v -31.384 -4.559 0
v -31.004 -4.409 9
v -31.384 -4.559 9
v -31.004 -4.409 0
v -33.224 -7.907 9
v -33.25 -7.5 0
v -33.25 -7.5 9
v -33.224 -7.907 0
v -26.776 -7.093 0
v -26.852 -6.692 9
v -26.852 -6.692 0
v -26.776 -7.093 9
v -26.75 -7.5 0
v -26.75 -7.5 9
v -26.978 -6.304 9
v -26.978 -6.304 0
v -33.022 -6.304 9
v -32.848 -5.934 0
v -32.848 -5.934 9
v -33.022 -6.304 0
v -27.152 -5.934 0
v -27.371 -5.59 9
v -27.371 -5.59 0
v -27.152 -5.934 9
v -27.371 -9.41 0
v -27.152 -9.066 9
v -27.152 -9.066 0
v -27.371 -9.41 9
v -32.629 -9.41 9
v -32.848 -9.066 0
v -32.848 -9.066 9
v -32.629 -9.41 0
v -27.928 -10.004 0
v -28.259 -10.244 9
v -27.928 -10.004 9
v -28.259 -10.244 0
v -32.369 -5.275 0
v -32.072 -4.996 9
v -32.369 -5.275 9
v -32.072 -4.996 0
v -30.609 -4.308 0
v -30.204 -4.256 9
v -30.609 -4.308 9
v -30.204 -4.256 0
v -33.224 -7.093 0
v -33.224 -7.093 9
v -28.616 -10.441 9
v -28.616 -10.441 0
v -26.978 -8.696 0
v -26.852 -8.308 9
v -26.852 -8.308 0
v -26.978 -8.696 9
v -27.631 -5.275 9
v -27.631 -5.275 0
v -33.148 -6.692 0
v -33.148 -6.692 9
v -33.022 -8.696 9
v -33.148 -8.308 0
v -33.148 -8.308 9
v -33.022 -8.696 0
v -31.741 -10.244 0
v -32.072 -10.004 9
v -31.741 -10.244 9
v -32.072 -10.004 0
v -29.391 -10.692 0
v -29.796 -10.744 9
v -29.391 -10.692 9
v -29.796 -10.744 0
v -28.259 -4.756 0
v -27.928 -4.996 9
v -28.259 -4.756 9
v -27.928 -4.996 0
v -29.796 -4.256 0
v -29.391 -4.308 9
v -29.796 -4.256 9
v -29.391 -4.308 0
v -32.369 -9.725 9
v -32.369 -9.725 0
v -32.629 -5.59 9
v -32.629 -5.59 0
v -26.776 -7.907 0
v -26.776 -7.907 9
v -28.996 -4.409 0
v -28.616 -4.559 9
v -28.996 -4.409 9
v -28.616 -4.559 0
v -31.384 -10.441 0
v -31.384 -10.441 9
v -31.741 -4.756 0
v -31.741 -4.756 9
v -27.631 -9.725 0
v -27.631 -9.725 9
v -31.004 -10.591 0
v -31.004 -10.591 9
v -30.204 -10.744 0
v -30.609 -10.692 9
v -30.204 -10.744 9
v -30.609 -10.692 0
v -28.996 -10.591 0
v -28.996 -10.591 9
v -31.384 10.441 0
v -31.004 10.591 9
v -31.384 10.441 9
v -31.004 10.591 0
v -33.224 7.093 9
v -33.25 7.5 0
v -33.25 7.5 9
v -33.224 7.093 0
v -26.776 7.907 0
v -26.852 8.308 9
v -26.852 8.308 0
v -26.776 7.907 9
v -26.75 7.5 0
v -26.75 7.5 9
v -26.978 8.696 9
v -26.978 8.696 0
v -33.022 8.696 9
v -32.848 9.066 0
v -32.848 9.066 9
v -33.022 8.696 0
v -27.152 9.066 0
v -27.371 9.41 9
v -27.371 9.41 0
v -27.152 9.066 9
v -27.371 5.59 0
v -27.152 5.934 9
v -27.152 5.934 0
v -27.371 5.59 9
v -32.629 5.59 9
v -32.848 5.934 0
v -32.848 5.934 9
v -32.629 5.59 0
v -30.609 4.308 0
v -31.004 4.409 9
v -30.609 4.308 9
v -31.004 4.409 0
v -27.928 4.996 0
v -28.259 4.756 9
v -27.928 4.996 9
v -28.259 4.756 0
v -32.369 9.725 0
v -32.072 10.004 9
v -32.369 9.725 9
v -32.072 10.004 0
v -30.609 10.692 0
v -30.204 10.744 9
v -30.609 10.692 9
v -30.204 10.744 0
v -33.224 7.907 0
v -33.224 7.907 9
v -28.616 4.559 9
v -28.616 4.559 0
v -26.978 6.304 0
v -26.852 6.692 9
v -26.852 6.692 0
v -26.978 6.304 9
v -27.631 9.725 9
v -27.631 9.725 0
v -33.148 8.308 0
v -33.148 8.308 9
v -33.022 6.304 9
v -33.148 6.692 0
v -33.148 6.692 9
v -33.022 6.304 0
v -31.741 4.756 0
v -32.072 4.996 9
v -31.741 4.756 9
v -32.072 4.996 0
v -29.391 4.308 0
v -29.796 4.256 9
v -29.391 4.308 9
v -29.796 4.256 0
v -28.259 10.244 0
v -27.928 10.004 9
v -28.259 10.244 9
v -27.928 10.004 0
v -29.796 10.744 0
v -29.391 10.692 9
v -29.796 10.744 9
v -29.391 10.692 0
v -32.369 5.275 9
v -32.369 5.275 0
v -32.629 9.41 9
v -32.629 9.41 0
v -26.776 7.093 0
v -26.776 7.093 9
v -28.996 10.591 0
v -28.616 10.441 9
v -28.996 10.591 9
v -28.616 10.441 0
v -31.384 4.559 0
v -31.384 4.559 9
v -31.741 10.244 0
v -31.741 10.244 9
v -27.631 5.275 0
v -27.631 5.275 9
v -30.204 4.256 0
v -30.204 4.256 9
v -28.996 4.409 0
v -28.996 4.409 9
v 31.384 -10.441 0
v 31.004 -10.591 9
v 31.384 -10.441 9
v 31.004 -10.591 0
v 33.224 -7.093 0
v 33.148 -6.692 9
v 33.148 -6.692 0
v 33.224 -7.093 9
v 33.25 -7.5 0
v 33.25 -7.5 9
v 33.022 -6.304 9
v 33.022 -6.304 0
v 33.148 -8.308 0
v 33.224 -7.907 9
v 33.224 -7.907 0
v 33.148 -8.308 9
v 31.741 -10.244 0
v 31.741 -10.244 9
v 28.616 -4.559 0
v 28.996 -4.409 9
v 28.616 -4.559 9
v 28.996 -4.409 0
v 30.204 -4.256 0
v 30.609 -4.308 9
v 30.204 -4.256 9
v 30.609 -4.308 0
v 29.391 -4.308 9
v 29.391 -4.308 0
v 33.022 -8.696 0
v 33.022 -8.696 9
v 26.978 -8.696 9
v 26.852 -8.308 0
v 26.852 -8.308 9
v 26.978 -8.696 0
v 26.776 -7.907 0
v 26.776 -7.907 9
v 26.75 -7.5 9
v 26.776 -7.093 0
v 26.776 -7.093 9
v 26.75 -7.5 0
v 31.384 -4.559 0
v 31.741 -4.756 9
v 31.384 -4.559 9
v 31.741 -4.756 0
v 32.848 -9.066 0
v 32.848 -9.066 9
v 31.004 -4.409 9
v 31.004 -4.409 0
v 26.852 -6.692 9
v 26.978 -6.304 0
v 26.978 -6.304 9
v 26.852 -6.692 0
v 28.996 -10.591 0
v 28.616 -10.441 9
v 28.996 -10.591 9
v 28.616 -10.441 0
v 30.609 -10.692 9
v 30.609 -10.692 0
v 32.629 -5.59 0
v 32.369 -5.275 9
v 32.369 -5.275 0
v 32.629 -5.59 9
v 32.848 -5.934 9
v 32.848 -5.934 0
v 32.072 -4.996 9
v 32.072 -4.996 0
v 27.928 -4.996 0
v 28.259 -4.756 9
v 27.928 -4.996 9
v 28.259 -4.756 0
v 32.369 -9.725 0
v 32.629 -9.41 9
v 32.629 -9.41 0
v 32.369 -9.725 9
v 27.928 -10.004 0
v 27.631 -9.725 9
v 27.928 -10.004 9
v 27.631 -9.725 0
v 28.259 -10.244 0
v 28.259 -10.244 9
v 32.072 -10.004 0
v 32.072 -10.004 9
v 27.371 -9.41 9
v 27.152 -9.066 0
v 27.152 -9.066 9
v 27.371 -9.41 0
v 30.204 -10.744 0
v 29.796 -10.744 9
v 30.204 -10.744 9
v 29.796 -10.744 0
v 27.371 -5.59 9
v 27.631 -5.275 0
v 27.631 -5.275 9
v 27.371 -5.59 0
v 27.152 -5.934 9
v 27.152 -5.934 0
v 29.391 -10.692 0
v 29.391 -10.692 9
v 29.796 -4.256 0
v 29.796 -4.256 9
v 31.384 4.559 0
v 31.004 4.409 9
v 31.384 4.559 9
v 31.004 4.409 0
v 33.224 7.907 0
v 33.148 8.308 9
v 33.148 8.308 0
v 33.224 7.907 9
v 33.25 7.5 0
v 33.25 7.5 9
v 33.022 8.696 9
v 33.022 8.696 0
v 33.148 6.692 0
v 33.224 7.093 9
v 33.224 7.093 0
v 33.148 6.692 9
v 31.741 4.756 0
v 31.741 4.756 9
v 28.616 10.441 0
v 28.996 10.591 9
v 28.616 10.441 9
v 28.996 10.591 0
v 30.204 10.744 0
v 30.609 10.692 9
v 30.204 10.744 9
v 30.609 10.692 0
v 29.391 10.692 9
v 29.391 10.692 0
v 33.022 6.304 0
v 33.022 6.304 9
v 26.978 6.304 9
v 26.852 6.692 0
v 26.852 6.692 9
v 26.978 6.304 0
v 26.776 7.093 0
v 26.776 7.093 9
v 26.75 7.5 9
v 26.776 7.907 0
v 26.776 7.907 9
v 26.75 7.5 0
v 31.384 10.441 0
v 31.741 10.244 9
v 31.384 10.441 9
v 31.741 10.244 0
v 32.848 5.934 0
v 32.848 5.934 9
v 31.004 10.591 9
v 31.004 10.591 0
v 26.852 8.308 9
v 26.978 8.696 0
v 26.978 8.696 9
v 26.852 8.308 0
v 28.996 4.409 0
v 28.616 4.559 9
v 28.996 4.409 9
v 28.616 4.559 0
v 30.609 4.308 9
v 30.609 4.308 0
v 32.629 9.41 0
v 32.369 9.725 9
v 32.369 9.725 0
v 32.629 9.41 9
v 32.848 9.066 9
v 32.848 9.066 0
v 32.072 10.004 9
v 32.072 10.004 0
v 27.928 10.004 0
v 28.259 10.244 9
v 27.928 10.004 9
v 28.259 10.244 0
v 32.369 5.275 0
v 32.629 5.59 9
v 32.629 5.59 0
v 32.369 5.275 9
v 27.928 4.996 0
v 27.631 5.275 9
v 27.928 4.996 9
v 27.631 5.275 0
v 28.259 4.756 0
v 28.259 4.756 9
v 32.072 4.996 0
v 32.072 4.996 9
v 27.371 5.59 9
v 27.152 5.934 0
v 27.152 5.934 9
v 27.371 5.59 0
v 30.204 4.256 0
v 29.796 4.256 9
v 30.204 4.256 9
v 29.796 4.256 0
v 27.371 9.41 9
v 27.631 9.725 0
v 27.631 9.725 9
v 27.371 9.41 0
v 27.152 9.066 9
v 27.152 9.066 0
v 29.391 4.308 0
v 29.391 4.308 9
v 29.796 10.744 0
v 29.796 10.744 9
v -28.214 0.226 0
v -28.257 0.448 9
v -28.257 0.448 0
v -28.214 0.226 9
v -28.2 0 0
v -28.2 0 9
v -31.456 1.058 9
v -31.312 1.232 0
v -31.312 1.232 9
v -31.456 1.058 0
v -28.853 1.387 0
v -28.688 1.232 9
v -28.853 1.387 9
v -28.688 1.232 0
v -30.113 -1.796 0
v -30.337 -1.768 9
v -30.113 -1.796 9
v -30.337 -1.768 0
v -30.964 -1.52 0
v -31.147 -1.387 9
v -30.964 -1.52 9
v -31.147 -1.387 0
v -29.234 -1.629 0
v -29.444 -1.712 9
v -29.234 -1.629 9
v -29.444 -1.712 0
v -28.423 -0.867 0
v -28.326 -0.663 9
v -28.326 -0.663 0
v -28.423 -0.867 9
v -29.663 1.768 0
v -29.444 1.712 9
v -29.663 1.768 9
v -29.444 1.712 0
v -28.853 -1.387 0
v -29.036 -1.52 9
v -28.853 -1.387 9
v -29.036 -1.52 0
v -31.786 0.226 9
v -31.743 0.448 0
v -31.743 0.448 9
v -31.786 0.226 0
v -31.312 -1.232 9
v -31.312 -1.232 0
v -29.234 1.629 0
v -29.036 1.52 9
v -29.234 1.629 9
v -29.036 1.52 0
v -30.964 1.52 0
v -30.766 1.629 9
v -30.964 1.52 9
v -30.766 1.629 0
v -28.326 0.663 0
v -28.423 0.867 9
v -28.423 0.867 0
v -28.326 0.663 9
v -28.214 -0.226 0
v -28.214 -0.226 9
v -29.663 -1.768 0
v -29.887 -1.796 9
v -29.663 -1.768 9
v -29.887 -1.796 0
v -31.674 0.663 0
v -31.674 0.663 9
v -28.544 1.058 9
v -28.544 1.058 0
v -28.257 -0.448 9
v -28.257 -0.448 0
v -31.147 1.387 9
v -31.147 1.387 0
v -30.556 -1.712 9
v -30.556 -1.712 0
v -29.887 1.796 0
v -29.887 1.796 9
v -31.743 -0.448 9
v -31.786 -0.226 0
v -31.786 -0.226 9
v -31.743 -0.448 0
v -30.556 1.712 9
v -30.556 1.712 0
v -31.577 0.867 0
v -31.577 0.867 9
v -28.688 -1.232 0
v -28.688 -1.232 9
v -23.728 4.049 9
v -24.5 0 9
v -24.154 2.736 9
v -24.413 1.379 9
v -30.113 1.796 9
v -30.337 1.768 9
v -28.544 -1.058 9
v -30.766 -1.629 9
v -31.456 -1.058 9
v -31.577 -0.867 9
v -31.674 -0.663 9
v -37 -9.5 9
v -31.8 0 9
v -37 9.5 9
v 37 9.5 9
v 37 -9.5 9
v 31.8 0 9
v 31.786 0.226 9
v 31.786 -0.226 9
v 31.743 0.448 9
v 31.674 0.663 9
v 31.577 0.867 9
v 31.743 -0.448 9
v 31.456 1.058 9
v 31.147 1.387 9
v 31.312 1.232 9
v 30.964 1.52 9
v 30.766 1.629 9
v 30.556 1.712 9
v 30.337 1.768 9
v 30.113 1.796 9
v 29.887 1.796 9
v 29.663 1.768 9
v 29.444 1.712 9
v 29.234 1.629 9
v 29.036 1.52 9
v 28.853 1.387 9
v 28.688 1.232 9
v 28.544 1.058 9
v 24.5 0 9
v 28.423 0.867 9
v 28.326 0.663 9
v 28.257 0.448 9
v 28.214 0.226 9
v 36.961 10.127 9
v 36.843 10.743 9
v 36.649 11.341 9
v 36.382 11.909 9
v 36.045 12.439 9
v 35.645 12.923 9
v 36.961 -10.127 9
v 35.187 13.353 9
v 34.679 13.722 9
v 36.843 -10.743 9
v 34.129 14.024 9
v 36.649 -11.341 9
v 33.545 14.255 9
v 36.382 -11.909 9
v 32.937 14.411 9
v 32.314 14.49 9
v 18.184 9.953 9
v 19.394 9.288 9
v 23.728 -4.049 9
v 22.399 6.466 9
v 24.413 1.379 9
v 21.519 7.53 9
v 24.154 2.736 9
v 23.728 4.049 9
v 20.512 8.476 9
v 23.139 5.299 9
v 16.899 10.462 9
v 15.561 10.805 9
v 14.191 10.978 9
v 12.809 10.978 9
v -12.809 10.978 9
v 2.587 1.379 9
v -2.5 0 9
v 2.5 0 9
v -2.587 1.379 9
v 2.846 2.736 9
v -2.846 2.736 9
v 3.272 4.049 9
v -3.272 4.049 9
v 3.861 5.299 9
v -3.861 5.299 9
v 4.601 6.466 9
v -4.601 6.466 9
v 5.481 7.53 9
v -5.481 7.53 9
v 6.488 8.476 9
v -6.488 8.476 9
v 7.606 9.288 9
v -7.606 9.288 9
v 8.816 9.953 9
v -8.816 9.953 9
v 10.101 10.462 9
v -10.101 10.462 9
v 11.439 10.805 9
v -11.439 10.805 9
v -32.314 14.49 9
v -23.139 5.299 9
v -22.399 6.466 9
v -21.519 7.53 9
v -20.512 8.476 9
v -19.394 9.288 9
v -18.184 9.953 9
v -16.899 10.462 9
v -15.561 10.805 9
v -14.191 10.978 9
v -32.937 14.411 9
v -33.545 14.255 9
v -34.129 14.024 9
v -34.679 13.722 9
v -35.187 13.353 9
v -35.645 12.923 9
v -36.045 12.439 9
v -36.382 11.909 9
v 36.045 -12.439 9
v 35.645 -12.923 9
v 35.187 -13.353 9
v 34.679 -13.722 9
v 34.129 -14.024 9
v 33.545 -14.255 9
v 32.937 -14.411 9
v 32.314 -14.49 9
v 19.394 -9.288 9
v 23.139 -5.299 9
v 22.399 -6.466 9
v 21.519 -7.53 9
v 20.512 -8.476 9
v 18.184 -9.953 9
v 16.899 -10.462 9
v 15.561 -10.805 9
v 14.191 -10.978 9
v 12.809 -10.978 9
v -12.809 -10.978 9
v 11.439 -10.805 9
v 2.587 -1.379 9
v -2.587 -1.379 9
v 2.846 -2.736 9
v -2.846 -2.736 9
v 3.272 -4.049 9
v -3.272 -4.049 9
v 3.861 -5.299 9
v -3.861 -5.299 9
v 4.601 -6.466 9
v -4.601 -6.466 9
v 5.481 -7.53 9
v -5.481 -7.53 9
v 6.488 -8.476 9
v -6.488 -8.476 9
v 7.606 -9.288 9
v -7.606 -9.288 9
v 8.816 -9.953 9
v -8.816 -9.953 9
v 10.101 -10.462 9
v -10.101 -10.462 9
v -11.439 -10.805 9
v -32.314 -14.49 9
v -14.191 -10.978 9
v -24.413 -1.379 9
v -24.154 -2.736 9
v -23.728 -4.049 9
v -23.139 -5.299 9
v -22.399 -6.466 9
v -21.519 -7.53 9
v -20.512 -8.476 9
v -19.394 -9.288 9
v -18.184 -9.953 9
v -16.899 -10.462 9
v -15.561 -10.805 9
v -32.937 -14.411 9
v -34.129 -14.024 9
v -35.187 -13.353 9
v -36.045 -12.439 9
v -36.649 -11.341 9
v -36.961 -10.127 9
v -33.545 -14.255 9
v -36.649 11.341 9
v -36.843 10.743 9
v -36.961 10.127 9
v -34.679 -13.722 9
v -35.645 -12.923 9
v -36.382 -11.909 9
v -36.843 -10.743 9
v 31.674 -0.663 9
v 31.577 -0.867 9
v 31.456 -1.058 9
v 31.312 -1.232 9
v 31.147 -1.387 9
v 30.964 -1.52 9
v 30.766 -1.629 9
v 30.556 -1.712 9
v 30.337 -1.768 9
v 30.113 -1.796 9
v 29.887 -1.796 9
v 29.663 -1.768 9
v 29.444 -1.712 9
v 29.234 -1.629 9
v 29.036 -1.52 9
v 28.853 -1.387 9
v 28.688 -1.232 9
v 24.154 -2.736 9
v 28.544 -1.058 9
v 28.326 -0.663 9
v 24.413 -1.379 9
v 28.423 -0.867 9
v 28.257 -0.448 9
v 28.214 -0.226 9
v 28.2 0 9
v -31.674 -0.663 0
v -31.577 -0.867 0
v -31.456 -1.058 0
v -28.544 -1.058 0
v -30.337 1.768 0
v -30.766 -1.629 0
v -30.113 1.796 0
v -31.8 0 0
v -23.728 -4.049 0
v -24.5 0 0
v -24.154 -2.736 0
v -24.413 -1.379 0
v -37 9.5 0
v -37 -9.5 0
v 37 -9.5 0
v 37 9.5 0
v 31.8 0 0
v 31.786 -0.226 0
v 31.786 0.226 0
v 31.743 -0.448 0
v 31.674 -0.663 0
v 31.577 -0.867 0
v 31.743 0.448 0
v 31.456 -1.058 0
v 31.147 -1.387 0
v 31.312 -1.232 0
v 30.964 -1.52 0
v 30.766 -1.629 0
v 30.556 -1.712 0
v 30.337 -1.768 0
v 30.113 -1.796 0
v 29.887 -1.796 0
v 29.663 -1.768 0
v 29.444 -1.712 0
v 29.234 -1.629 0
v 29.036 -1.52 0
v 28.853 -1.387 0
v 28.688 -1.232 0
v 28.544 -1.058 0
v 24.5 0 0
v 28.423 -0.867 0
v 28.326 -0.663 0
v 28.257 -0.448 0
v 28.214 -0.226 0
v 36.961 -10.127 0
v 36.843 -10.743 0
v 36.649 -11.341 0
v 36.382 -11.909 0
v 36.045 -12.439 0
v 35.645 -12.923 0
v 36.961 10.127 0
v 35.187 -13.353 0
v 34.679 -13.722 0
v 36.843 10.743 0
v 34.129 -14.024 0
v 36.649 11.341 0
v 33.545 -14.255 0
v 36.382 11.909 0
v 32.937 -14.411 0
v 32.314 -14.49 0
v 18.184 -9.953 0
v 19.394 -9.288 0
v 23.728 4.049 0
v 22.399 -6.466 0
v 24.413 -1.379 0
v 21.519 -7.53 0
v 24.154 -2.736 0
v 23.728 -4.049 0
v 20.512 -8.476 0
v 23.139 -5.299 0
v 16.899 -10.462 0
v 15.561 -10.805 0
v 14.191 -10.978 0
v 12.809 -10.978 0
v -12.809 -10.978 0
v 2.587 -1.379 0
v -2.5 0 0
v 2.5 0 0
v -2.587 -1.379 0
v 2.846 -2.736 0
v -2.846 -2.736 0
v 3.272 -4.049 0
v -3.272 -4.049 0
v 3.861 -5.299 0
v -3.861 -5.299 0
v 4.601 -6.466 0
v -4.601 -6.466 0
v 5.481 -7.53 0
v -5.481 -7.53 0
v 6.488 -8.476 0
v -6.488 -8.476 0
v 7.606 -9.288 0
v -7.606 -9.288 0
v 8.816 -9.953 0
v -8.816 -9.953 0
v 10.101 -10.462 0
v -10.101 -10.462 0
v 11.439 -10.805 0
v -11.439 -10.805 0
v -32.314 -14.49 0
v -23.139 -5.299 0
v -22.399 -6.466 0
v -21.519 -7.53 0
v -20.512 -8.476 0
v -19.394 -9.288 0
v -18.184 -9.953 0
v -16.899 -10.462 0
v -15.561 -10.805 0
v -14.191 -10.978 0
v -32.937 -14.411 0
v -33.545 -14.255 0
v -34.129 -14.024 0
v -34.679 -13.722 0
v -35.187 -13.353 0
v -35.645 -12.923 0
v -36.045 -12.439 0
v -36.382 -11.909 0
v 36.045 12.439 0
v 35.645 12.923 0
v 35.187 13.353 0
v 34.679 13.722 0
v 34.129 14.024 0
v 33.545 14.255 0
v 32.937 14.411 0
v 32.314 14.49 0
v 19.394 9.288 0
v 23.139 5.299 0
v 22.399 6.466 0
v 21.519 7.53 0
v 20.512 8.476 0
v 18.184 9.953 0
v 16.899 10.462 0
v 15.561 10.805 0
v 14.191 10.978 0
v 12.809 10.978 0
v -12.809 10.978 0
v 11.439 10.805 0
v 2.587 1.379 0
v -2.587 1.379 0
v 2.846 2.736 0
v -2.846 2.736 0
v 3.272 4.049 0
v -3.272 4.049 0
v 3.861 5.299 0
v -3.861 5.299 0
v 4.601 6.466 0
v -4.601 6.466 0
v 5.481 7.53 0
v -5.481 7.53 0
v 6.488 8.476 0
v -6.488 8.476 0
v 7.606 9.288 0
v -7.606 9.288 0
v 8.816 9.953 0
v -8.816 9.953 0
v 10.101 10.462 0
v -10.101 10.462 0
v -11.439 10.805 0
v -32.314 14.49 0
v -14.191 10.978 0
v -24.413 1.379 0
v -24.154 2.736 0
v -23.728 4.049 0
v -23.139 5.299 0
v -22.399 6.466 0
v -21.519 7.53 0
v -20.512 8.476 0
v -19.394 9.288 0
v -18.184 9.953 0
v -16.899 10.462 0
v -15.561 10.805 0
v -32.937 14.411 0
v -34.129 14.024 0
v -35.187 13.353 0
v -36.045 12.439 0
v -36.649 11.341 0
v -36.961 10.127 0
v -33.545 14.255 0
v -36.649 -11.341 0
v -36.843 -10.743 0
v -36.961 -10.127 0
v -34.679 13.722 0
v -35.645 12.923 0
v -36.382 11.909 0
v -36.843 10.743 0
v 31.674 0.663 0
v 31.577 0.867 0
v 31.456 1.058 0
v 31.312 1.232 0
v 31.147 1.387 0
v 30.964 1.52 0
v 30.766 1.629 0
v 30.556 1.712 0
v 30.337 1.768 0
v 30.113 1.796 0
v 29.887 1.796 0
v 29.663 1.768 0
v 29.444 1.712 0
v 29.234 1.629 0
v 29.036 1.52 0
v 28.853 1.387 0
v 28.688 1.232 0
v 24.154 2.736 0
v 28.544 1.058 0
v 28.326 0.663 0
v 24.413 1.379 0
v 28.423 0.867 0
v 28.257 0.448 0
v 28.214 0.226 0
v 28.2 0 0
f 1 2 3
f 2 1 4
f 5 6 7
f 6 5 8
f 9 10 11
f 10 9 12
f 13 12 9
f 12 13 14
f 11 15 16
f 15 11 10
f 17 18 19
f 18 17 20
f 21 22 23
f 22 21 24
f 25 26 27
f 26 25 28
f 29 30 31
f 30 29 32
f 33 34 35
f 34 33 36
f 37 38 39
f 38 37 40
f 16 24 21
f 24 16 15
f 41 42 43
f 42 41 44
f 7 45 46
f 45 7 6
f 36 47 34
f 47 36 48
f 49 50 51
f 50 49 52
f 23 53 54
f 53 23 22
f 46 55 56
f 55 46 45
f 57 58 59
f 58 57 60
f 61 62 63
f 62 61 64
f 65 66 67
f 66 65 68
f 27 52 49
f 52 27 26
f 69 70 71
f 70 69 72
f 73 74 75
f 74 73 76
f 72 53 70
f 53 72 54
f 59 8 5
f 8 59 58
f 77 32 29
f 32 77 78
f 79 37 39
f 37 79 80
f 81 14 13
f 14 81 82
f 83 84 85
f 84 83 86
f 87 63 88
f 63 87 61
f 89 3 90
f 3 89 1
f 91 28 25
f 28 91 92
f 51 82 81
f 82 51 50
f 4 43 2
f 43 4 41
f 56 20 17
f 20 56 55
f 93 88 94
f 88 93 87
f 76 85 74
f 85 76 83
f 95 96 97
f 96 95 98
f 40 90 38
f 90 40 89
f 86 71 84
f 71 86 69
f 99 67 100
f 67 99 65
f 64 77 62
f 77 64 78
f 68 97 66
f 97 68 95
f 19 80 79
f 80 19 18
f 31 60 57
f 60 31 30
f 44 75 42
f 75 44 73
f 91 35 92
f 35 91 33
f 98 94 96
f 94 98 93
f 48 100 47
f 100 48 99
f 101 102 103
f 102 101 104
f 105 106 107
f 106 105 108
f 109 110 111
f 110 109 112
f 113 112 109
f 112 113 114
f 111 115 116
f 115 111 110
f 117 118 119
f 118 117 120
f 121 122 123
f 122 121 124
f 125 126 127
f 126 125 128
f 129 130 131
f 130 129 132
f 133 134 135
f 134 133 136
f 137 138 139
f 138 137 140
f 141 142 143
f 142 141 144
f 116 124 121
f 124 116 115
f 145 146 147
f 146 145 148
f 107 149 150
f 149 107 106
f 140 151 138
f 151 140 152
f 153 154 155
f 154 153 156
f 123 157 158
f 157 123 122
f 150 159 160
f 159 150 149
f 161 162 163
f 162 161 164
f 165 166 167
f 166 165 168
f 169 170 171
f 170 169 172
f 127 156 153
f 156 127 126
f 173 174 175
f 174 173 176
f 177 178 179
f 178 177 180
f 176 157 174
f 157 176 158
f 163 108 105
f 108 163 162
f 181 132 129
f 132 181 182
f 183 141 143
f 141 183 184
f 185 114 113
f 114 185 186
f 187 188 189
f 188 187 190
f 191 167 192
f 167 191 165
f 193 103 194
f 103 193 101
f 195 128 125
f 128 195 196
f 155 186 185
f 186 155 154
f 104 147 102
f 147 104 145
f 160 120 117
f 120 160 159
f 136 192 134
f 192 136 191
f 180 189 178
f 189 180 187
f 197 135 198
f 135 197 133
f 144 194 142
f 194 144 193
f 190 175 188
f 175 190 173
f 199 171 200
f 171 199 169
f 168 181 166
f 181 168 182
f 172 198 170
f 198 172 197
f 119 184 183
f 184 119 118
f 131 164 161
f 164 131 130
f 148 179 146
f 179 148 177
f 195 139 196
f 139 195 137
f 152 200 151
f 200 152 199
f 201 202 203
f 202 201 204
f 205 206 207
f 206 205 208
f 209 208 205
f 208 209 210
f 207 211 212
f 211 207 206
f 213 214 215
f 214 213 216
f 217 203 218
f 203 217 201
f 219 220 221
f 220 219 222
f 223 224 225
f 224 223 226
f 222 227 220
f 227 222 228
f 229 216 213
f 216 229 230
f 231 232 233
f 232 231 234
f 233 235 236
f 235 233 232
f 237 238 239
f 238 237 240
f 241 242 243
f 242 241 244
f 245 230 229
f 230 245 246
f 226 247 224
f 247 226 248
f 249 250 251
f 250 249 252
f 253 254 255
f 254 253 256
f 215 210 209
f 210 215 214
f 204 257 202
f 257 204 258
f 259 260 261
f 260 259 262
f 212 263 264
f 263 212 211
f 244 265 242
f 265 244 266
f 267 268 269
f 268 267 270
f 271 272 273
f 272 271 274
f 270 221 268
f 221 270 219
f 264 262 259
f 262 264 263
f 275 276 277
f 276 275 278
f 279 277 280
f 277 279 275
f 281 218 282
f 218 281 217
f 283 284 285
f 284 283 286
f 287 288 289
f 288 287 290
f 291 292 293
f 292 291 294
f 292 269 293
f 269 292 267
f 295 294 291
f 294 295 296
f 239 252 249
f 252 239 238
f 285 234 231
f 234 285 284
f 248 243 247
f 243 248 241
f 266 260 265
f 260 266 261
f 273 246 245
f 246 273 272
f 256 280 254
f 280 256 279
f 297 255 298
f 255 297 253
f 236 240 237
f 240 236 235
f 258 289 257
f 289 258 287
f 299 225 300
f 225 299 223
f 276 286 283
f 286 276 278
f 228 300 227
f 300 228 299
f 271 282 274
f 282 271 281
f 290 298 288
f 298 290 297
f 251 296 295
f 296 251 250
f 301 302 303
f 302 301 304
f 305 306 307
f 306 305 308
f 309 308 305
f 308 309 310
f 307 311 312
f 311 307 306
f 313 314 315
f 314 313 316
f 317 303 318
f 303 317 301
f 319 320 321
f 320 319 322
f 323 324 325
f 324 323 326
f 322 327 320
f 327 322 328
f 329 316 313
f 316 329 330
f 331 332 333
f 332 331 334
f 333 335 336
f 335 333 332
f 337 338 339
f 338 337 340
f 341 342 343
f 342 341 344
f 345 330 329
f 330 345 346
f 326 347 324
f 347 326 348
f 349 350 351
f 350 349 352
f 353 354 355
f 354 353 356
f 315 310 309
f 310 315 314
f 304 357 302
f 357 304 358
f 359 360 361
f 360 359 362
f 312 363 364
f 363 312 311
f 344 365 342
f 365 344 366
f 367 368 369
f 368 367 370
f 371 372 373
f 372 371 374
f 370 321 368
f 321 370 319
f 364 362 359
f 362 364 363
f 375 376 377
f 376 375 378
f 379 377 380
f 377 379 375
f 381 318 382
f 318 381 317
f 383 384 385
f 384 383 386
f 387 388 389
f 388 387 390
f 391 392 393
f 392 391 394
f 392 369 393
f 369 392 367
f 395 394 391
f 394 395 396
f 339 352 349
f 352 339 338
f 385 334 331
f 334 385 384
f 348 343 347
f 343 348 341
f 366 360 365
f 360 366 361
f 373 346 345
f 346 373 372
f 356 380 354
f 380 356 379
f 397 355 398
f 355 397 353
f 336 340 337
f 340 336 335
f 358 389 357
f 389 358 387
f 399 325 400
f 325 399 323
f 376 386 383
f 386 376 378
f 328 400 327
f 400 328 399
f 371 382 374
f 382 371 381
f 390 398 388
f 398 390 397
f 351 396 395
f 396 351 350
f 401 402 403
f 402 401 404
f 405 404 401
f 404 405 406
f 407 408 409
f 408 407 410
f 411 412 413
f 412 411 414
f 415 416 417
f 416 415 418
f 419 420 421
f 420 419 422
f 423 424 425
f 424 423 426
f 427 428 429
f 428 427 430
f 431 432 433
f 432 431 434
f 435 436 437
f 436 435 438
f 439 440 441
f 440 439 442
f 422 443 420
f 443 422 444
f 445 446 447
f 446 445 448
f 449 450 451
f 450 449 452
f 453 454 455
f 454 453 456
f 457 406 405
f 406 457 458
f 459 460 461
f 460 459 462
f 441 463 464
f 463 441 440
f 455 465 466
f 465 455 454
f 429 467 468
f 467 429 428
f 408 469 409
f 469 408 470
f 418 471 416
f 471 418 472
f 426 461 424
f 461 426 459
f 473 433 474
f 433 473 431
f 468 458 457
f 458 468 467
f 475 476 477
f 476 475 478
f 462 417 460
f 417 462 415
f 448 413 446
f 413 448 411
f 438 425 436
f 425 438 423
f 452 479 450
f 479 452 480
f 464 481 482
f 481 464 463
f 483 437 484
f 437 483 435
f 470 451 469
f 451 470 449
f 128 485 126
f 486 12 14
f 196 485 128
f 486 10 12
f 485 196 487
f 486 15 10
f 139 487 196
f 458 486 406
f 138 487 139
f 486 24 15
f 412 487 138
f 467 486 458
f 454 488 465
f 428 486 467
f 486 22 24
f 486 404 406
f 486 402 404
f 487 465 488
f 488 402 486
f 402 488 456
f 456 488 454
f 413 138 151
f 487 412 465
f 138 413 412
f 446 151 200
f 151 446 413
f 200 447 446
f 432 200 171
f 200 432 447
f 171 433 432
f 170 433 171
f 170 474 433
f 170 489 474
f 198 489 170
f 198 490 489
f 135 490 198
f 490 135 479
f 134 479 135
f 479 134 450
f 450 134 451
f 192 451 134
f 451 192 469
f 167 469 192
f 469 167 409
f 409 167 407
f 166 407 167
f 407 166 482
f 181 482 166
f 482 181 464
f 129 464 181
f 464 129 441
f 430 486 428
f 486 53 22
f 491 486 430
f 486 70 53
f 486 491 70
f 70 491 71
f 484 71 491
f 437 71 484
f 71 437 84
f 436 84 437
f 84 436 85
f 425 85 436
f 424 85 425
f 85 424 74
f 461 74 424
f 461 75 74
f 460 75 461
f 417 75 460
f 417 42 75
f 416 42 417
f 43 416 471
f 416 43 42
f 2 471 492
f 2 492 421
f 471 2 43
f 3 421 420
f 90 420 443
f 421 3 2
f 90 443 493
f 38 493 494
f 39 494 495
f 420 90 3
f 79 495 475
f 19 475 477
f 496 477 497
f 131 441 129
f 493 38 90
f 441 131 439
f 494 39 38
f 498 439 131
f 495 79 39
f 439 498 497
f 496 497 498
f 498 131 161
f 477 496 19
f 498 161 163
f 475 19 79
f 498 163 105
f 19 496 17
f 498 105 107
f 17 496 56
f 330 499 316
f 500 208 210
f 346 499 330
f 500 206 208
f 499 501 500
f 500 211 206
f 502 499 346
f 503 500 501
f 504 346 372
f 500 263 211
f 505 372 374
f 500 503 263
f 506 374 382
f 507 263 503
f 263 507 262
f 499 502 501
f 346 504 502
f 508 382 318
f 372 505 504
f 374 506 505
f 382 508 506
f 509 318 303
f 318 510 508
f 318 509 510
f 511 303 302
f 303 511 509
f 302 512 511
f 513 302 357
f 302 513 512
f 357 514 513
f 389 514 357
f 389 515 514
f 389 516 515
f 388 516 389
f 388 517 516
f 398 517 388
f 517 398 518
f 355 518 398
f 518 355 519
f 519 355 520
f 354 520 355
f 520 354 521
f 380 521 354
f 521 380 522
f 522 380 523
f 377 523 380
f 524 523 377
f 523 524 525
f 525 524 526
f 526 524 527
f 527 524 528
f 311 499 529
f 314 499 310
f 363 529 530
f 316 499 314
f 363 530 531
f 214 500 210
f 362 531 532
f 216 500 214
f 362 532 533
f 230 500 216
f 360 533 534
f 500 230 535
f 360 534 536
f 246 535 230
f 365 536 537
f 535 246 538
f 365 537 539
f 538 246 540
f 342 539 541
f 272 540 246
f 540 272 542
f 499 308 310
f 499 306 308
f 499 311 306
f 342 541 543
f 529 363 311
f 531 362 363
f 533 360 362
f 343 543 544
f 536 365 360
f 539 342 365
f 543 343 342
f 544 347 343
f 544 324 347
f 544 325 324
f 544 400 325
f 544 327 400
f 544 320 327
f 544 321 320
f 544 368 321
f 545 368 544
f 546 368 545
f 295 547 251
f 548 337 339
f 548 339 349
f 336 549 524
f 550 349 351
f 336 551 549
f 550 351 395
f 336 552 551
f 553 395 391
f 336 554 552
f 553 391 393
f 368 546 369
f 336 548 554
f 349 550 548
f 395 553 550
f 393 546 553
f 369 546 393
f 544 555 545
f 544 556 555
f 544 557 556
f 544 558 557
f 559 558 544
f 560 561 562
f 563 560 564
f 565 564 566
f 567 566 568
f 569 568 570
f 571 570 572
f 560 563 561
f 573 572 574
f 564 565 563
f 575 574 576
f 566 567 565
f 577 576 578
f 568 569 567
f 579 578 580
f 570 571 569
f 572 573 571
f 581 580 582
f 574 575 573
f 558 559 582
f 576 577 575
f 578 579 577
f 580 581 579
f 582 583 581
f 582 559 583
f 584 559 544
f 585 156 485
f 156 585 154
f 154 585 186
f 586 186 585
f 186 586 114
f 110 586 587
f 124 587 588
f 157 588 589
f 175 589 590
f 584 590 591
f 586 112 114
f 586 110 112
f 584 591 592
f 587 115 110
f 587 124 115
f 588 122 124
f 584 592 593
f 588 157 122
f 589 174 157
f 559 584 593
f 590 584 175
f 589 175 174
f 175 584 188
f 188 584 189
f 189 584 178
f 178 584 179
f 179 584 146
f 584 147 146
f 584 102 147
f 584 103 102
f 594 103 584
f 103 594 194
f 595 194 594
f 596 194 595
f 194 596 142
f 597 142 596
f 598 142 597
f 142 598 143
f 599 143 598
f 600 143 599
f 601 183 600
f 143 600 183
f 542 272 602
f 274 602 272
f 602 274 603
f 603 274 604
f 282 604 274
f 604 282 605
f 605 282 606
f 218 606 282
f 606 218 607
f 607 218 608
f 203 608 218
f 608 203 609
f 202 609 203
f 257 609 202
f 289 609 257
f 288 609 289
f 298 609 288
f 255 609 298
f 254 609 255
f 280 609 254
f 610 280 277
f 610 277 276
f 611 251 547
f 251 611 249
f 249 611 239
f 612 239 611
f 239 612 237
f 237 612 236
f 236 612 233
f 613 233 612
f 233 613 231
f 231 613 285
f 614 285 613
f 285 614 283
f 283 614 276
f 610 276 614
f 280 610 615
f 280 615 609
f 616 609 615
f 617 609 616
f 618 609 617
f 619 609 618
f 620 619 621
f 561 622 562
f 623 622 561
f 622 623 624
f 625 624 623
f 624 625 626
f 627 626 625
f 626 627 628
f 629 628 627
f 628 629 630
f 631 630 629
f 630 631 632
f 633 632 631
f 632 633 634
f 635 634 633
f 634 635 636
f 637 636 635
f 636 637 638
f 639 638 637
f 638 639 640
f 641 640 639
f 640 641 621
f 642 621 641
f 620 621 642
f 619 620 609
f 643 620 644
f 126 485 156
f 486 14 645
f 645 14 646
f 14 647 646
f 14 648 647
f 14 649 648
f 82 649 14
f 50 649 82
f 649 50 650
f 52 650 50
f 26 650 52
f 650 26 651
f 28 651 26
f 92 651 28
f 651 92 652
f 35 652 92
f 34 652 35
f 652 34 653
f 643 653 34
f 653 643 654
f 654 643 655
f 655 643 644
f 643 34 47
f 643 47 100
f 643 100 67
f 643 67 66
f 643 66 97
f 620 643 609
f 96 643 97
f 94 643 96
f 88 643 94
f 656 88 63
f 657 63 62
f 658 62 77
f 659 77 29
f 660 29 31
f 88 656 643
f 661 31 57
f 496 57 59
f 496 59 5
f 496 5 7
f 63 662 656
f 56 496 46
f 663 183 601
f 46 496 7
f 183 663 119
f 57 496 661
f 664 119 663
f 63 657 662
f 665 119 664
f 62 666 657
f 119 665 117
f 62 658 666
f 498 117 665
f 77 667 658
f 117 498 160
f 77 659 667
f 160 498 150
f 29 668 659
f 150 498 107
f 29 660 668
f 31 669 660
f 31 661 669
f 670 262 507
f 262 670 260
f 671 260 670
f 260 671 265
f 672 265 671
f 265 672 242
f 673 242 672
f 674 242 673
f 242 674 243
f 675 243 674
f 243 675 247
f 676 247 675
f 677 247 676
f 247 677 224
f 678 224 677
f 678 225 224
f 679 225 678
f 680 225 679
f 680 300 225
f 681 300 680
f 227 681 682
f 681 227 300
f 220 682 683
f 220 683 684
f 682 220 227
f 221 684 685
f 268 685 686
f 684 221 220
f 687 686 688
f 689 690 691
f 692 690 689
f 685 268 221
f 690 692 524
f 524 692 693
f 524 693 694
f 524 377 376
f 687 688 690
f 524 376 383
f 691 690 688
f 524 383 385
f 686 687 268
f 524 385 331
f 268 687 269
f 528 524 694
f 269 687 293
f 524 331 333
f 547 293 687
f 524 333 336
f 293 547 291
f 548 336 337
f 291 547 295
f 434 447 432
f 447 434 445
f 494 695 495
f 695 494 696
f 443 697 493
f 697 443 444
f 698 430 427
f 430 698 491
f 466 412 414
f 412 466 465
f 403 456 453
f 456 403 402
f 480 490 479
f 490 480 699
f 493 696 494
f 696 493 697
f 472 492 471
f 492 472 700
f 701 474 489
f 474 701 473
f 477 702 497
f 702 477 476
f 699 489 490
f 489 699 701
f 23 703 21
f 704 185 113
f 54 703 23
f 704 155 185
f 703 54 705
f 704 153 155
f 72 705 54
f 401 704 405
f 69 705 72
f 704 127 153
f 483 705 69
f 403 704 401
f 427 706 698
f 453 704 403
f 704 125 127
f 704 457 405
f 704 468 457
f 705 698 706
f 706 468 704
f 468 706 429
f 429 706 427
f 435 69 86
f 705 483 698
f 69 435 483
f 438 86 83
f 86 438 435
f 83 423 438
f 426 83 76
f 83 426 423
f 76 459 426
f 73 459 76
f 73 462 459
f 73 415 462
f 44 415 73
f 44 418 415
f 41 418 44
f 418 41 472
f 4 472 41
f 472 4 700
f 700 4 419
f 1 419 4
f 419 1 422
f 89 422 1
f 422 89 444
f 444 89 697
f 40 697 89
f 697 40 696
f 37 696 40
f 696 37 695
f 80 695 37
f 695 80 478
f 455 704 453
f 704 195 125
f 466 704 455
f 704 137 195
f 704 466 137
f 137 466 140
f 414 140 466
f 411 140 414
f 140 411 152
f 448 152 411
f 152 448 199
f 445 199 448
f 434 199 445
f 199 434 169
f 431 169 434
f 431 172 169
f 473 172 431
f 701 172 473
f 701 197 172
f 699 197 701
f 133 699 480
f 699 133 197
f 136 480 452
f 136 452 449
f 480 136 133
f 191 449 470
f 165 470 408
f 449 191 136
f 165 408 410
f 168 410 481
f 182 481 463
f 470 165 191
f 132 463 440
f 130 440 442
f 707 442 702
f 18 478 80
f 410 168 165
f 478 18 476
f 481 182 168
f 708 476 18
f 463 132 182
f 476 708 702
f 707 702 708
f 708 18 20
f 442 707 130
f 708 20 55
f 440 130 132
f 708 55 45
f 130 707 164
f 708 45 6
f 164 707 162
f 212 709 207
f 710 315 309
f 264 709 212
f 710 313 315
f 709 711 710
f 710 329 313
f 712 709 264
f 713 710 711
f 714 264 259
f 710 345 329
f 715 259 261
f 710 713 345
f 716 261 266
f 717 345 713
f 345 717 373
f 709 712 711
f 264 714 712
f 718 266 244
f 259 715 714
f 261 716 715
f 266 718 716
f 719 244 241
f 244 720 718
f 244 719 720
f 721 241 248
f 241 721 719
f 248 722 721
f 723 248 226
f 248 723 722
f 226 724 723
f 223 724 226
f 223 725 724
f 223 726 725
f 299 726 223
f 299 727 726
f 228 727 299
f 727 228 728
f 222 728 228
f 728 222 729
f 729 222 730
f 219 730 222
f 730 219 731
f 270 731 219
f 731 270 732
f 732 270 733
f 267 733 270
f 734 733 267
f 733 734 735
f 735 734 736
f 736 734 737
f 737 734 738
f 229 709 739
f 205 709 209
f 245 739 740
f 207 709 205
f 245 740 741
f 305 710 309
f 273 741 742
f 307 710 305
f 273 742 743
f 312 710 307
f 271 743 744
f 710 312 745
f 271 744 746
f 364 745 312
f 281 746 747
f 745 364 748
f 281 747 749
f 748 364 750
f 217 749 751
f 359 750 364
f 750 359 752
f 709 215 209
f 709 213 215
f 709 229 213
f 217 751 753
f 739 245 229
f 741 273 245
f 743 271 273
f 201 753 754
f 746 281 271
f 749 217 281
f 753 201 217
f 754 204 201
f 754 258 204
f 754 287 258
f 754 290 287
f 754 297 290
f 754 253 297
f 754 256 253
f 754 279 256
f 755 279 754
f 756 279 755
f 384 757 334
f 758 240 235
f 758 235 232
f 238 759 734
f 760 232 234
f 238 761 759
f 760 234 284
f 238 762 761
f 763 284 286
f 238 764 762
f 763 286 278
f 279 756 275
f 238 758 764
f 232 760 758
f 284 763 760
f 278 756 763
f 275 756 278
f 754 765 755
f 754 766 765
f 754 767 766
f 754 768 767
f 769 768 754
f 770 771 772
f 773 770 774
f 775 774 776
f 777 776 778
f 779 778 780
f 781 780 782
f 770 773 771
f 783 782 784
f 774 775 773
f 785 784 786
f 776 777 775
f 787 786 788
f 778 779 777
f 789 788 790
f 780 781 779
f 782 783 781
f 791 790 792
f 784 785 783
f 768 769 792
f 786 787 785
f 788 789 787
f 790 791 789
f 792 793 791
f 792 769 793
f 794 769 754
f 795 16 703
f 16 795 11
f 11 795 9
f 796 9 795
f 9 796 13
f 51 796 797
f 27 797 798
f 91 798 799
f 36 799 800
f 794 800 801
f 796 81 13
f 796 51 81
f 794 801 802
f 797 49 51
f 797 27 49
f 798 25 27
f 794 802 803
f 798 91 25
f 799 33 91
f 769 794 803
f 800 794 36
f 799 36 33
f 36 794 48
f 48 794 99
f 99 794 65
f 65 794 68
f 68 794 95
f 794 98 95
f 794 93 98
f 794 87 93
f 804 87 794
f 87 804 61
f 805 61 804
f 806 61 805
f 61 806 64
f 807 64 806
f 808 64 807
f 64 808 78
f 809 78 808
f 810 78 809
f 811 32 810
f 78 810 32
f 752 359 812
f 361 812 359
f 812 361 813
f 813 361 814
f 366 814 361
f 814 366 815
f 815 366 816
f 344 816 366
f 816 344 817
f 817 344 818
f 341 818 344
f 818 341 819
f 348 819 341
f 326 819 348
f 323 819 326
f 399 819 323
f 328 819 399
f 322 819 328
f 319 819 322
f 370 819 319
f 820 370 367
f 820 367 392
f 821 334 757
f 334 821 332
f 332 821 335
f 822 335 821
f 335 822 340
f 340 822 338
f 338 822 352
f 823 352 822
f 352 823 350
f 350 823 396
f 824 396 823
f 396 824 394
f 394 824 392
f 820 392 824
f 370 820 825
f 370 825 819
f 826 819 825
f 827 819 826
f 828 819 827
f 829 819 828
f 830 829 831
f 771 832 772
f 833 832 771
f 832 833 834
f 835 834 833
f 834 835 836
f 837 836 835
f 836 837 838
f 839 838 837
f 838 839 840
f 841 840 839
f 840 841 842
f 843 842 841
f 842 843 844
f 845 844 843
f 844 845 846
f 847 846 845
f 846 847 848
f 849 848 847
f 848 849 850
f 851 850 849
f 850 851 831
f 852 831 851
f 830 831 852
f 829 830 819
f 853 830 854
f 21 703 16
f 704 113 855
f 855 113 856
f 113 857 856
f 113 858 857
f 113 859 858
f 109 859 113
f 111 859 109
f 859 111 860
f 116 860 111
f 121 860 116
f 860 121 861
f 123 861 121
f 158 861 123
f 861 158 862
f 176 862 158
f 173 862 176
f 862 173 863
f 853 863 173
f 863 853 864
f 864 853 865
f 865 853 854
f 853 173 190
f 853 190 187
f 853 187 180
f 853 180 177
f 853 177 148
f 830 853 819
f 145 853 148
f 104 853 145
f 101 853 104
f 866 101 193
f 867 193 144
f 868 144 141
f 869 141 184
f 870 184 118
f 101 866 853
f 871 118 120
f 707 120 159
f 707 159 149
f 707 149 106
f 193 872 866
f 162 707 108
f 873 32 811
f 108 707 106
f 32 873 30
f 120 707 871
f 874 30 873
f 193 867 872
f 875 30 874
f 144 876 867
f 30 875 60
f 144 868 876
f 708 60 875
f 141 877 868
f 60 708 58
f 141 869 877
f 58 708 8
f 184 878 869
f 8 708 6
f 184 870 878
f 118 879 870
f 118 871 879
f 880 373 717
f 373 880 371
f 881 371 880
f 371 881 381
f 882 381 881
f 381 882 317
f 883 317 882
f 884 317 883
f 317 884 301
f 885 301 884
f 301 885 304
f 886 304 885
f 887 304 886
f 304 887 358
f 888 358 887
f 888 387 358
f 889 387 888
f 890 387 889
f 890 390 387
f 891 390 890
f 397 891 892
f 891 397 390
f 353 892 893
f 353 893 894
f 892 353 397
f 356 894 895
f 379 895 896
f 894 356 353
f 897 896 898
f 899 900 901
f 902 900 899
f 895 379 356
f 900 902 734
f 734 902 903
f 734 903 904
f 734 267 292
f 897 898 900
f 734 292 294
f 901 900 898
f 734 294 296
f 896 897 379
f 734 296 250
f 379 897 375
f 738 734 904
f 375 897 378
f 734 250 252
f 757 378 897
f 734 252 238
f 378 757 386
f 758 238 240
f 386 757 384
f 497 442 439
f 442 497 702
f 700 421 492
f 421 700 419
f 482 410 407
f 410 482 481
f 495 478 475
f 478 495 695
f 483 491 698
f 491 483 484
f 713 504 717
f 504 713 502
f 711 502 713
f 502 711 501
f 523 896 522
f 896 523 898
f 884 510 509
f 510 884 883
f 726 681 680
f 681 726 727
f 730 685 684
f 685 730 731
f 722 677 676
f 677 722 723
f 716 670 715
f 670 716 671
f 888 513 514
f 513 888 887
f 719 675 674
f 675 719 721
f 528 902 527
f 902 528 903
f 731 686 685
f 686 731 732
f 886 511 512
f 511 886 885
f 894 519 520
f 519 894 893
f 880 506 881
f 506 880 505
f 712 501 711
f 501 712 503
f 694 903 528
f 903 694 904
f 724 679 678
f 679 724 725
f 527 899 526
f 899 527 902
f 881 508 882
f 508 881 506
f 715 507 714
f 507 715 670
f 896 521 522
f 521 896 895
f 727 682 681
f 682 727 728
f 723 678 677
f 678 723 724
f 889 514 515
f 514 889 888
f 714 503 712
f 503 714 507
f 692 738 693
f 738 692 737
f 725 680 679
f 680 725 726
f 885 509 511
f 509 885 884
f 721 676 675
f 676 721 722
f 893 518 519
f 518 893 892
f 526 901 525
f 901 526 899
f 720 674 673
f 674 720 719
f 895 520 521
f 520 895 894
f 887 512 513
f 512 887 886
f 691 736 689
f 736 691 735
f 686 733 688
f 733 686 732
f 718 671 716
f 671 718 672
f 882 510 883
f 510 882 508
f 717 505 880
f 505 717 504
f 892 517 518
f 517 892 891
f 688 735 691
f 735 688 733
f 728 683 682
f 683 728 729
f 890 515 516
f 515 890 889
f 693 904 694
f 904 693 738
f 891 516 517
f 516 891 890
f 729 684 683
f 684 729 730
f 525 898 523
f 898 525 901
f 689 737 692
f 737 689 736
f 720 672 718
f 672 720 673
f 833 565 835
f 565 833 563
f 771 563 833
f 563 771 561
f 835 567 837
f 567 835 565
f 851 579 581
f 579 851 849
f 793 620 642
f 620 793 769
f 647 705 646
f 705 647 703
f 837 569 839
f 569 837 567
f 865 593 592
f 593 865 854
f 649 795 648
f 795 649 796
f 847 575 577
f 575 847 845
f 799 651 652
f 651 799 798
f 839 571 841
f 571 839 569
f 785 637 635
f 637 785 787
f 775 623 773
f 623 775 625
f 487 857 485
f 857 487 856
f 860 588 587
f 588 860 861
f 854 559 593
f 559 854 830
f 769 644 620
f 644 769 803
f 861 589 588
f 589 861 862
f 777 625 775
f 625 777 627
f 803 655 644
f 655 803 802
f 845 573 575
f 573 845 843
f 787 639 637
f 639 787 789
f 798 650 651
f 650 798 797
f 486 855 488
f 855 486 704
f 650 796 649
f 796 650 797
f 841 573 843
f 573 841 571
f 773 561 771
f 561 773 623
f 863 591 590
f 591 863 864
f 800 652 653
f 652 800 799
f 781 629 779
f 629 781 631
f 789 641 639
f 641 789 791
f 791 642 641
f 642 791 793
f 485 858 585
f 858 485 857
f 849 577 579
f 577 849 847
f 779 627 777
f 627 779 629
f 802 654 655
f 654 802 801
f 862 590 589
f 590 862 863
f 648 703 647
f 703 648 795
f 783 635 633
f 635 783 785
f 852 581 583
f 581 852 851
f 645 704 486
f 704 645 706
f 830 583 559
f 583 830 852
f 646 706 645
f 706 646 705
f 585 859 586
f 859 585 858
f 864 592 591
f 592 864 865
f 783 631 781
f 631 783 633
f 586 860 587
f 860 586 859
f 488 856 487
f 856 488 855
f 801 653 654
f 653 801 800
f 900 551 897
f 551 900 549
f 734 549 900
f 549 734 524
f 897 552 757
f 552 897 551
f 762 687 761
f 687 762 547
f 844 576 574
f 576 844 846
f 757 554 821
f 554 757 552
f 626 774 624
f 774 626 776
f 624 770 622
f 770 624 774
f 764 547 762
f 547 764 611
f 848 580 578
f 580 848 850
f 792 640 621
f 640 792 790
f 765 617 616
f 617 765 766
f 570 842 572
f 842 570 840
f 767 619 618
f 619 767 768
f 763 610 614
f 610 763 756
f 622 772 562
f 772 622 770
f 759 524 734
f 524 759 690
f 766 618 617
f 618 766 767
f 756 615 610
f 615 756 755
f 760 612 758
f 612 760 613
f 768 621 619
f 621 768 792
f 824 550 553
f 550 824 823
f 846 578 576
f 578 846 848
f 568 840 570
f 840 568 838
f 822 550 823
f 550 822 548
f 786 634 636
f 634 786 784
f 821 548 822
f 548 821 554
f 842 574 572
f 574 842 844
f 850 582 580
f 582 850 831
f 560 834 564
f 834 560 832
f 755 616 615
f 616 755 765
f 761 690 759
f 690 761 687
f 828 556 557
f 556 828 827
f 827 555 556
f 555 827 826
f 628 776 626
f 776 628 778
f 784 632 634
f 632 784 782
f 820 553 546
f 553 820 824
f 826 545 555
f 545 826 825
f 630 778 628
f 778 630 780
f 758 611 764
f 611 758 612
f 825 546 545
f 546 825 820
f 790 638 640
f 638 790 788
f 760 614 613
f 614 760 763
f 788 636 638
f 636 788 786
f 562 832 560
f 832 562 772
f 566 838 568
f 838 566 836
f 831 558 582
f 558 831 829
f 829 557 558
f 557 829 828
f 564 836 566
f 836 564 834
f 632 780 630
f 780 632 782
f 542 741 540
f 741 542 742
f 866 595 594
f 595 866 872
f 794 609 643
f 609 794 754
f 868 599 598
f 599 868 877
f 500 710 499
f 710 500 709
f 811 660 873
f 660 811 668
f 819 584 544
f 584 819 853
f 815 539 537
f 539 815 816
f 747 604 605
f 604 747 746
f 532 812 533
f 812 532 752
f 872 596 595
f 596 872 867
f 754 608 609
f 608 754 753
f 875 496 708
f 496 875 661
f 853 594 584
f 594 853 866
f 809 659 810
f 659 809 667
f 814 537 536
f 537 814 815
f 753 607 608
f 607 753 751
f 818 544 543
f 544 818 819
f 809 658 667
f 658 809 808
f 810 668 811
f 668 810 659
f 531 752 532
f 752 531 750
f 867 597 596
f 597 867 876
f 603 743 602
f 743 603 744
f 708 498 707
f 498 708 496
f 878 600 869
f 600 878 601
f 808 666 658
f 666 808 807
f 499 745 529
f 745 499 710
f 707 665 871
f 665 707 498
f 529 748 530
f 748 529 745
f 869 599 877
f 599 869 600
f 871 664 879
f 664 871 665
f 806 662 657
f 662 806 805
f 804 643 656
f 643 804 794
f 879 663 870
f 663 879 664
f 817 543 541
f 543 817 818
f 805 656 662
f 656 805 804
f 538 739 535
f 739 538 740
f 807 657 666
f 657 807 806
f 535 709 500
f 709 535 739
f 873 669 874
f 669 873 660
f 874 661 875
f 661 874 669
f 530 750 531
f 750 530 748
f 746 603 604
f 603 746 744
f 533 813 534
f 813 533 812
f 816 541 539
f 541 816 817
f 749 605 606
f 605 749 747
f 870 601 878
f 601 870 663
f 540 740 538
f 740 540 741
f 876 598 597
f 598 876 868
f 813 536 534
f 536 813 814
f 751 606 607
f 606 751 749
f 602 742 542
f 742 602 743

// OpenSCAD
$fn = 50;


difference() {
	union() {
		hull() {
			translate(v = [-32.0000000000, 9.5000000000, 0]) {
				cylinder(h = 9, r = 5);
			}
			translate(v = [32.0000000000, 9.5000000000, 0]) {
				cylinder(h = 9, r = 5);
			}
			translate(v = [-32.0000000000, -9.5000000000, 0]) {
				cylinder(h = 9, r = 5);
			}
			translate(v = [32.0000000000, -9.5000000000, 0]) {
				cylinder(h = 9, r = 5);
			}
		}
	}
	union() {
		#translate(v = [-30.0000000000, -7.5000000000, 0]) {
			cylinder(h = 9, r = 3.2500000000);
		}
		#translate(v = [-30.0000000000, 7.5000000000, 0]) {
			cylinder(h = 9, r = 3.2500000000);
		}
		#translate(v = [30.0000000000, -7.5000000000, 0]) {
			cylinder(h = 9, r = 3.2500000000);
		}
		#translate(v = [30.0000000000, 7.5000000000, 0]) {
			cylinder(h = 9, r = 3.2500000000);
		}
		#translate(v = [-30.0000000000, -7.5000000000, -100.0000000000]) {
			cylinder(h = 200, r = 3.2500000000);
		}
		#translate(v = [-30.0000000000, 7.5000000000, -100.0000000000]) {
			cylinder(h = 200, r = 3.2500000000);
		}
		#translate(v = [30.0000000000, -7.5000000000, -100.0000000000]) {
			cylinder(h = 200, r = 3.2500000000);
		}
		#translate(v = [30.0000000000, 7.5000000000, -100.0000000000]) {
			cylinder(h = 200, r = 3.2500000000);
		}
		#translate(v = [-30.0000000000, -7.5000000000, 0]) {
			cylinder(h = 9, r = 1.8000000000);
		}
		#translate(v = [-30.0000000000, 0.0000000000, 0]) {
			cylinder(h = 9, r = 1.8000000000);
		}
		#translate(v = [-30.0000000000, 7.5000000000, 0]) {
			cylinder(h = 9, r = 1.8000000000);
		}
		#translate(v = [30.0000000000, -7.5000000000, 0]) {
			cylinder(h = 9, r = 1.8000000000);
		}
		#translate(v = [30.0000000000, 0.0000000000, 0]) {
			cylinder(h = 9, r = 1.8000000000);
		}
		#translate(v = [30.0000000000, 7.5000000000, 0]) {
			cylinder(h = 9, r = 1.8000000000);
		}
		#translate(v = [-30.0000000000, -7.5000000000, 0]) {
			cylinder(h = 9, r = 1.8000000000);
		}
		#translate(v = [-30.0000000000, 0.0000000000, 0]) {
			cylinder(h = 9, r = 1.8000000000);
		}
		#translate(v = [-30.0000000000, 7.5000000000, 0]) {
			cylinder(h = 9, r = 1.8000000000);
		}
		#translate(v = [30.0000000000, -7.5000000000, 0]) {
			cylinder(h = 9, r = 1.8000000000);
		}
		#translate(v = [30.0000000000, 0.0000000000, 0]) {
			cylinder(h = 9, r = 1.8000000000);
		}
		#translate(v = [30.0000000000, 7.5000000000, 0]) {
			cylinder(h = 9, r = 1.8000000000);
		}
		#translate(v = [-30.0000000000, -7.5000000000, 0]) {
			cylinder(h = 9, r = 1.8000000000);
		}
		#translate(v = [-30.0000000000, 0.0000000000, 0]) {
			cylinder(h = 9, r = 1.8000000000);
		}
		#translate(v = [-30.0000000000, 7.5000000000, 0]) {
			cylinder(h = 9, r = 1.8000000000);
		}
		#translate(v = [30.0000000000, -7.5000000000, 0]) {
			cylinder(h = 9, r = 1.8000000000);
		}
		#translate(v = [30.0000000000, 0.0000000000, 0]) {
			cylinder(h = 9, r = 1.8000000000);
		}
		#translate(v = [30.0000000000, 7.5000000000, 0]) {
			cylinder(h = 9, r = 1.8000000000);
		}
		#translate(v = [-13.5000000000, 0, 0]) {
			cylinder(h = 9, r = 11.0000000000);
		}
		#translate(v = [13.5000000000, 0, 0]) {
			cylinder(h = 9, r = 11.0000000000);
		}
	}
}
